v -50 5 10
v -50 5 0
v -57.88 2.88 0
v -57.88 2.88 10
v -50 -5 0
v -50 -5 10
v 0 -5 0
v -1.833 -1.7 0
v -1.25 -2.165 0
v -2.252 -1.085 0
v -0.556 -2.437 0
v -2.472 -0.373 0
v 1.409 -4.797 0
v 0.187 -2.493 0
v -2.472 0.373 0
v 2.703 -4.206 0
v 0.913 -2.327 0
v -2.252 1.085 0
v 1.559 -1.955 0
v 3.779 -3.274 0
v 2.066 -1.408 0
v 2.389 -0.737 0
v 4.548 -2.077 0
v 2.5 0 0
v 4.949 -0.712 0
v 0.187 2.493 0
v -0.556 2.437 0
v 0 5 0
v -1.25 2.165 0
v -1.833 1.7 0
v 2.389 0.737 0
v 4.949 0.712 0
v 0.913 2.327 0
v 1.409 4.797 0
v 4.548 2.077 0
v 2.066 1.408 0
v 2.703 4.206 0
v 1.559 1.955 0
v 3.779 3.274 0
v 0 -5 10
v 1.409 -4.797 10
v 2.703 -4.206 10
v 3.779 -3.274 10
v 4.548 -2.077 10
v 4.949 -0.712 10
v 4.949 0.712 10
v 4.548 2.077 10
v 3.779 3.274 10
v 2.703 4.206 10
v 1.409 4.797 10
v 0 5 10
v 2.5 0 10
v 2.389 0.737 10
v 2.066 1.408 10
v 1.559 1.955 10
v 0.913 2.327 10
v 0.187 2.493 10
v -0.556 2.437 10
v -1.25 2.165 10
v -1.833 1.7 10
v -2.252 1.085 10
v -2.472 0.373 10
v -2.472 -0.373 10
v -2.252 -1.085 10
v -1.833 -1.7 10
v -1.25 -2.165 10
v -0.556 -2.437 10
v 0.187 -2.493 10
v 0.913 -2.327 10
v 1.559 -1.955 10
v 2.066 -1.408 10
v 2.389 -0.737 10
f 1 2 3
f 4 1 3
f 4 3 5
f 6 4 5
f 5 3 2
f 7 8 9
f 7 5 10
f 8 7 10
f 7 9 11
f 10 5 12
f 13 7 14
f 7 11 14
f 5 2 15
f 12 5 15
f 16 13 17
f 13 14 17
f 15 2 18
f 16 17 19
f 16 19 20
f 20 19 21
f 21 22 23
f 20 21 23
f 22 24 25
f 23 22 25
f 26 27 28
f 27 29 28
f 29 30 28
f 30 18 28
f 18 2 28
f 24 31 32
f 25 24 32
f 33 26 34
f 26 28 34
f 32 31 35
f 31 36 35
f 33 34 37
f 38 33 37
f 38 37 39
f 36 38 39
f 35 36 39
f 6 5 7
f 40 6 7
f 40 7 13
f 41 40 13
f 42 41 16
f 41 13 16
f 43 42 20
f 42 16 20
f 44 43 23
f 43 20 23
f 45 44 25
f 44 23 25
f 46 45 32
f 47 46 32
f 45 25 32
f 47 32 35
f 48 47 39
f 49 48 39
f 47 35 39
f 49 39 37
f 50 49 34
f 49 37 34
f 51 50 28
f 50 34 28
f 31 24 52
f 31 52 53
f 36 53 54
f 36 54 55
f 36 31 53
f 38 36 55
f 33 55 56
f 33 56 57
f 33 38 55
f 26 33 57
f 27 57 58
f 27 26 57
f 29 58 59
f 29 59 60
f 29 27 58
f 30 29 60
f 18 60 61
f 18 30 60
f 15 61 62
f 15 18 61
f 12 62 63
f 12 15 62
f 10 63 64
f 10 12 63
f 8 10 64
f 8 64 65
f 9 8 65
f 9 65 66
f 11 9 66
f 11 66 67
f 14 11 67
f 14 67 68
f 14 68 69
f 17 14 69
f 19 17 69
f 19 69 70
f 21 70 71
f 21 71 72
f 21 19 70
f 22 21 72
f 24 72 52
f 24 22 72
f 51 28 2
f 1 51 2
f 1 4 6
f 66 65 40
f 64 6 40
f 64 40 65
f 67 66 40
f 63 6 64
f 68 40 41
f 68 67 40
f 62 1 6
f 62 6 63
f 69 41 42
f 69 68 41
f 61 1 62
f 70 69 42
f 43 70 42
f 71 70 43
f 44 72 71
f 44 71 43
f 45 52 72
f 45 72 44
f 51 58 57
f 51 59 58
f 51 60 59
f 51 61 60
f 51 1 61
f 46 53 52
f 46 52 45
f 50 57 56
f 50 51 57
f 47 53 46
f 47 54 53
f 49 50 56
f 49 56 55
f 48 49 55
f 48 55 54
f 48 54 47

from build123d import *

# Parameters (mm, degrees)
SKETCH1_R           = 2.5
BOSS_EXTRUDE1_DEPTH = 10


with BuildPart() as part:
    # Sketch1 → Boss-Extrude1 (new body)
    with BuildSketch(Plane.XY):
        with BuildLine():
            Line((0, 5), (-50, 5))
            Line((-50, 5), (-57.880486008, 2.880486008))
            Line((-57.880486008, 2.880486008), (-50, -5))
            Line((-50, -5), (0, -5))
            ThreePointArc((0, -5), (5, 0), (0, 5))
        make_face()
        Circle(SKETCH1_R, mode=Mode.SUBTRACT)
    extrude(amount=BOSS_EXTRUDE1_DEPTH)


solid = part.part
